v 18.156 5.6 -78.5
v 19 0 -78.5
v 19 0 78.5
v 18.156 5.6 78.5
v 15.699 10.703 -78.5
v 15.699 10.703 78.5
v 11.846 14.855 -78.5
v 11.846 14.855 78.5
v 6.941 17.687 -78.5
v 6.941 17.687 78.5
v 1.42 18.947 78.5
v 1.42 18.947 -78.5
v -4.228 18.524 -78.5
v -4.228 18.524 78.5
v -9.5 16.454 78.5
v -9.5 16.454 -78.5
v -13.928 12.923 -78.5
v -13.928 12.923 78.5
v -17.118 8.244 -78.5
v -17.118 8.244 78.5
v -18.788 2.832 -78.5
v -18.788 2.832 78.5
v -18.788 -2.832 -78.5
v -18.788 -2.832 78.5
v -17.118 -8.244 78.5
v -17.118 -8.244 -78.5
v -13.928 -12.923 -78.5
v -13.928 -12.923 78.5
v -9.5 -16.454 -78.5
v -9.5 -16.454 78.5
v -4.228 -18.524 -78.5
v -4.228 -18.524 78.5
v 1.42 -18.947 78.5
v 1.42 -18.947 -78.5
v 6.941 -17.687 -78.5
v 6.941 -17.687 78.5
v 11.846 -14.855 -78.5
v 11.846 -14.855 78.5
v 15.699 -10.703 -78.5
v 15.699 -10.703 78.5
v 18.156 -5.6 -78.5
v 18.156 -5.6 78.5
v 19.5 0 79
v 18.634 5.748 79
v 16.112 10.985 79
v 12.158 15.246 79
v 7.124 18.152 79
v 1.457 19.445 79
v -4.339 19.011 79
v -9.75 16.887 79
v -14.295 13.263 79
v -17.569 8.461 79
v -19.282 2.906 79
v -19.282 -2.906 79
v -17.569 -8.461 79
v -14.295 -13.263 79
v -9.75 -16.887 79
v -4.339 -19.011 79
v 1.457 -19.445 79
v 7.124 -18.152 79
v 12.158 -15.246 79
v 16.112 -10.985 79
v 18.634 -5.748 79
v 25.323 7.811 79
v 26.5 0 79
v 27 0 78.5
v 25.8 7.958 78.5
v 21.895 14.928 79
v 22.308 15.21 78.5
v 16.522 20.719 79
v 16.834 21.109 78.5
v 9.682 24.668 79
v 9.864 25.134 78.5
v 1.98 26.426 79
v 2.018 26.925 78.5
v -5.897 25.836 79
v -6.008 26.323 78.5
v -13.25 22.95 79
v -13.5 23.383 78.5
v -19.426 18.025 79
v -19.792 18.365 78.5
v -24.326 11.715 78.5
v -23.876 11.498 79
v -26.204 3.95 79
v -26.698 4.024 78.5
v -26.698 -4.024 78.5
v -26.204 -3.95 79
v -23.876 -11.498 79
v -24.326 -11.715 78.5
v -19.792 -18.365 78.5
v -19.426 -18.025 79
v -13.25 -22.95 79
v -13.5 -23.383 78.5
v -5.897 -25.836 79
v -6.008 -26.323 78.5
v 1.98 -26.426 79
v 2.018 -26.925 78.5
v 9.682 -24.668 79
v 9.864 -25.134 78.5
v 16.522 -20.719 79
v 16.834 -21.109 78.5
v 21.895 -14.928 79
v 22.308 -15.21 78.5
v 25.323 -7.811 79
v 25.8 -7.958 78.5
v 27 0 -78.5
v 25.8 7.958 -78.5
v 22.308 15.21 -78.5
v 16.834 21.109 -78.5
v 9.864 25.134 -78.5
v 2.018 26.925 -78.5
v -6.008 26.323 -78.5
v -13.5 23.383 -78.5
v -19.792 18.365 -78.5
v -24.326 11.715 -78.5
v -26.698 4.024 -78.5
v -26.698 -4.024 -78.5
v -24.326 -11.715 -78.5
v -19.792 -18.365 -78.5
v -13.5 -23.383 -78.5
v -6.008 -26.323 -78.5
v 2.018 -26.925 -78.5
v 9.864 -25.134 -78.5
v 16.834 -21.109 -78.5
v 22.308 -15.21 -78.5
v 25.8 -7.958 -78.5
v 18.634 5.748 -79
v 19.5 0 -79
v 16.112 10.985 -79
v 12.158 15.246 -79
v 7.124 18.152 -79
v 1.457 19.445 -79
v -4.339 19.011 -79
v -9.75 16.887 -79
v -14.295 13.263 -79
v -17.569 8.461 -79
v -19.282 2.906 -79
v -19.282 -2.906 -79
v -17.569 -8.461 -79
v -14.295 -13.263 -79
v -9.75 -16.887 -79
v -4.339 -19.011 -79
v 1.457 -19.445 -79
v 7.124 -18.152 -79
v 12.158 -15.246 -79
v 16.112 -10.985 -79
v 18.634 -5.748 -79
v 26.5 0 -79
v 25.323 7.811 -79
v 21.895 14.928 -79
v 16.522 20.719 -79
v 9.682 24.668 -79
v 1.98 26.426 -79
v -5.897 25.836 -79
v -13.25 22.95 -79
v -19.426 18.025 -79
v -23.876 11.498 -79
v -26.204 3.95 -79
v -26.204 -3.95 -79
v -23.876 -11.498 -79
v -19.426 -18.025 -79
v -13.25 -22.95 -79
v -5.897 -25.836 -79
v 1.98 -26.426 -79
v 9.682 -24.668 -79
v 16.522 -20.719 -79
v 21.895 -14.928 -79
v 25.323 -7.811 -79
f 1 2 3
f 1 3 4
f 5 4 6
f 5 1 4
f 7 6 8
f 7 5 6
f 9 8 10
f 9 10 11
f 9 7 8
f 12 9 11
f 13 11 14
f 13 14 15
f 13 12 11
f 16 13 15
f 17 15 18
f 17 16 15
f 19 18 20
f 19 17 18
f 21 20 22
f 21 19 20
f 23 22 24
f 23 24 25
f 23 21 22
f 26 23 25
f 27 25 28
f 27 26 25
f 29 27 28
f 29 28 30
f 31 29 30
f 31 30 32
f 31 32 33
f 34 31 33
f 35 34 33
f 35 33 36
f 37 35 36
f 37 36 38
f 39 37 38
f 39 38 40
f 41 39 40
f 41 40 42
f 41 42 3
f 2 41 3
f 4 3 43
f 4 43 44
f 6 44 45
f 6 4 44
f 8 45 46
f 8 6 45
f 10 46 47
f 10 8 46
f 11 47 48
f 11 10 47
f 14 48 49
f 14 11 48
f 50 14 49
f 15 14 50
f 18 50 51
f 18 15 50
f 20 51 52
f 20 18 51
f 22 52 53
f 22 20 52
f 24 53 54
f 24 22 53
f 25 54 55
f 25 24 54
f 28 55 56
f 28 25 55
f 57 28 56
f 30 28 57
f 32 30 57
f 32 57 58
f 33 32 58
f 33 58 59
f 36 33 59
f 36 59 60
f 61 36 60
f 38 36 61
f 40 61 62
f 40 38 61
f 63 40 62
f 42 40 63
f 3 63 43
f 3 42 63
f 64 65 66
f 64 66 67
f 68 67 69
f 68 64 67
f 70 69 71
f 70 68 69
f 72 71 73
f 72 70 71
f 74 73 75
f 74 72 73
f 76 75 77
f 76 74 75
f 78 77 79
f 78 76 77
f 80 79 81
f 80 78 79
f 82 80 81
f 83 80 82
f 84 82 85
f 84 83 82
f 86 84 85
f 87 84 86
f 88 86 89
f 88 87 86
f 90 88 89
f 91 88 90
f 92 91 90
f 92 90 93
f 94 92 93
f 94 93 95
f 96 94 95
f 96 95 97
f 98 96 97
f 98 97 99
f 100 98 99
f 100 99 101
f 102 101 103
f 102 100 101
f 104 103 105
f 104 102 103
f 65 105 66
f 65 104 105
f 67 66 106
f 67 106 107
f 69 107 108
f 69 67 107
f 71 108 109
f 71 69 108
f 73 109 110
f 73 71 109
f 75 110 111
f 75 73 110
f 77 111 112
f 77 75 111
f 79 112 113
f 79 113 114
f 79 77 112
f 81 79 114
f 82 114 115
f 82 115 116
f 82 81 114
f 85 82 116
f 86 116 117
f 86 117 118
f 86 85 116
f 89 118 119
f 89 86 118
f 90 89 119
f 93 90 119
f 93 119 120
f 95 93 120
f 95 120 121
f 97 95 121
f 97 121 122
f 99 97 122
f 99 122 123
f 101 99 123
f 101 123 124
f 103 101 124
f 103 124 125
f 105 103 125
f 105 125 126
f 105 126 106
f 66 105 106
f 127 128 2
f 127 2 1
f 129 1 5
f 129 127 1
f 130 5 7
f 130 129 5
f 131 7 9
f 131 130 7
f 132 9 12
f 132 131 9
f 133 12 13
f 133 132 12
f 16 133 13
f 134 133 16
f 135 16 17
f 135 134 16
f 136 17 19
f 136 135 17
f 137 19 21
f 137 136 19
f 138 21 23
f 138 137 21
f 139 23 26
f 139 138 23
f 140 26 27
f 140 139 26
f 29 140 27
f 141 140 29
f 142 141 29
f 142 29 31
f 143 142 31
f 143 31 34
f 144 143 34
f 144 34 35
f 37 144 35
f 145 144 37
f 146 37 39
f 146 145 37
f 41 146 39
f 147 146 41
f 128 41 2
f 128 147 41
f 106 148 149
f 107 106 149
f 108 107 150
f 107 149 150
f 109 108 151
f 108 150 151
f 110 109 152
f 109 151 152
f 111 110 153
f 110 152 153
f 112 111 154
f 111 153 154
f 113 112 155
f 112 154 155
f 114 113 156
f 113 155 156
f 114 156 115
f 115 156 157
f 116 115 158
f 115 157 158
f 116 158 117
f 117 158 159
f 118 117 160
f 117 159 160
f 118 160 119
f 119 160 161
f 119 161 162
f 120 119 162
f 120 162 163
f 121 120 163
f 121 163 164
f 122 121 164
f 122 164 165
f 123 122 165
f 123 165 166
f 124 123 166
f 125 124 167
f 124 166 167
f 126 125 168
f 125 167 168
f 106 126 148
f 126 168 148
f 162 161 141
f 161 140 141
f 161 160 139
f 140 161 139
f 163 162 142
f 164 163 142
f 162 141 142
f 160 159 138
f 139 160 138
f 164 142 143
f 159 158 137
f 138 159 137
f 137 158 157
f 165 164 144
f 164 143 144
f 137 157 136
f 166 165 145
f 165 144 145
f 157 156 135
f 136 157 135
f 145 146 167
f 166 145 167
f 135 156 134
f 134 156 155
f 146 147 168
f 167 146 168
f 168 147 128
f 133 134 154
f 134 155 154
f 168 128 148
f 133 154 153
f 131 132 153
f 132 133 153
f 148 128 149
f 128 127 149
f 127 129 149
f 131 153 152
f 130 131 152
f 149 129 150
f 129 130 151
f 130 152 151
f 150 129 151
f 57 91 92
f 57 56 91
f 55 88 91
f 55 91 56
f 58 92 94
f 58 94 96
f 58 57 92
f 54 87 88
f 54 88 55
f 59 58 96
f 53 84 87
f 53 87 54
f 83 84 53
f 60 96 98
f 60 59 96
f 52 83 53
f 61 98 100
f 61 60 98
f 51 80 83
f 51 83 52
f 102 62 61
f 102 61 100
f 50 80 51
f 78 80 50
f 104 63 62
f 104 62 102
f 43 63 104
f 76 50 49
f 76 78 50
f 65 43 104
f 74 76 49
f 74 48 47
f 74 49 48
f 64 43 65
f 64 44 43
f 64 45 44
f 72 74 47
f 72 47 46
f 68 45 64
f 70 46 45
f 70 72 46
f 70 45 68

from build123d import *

# Parameters (mm, degrees)
SKIZZE1_R                       = 27
SKIZZE1_R_2                     = 19
AUFSATZ_LINEAR_AUSTRAGEN1_DEPTH = 79
FASE1_SIZE                      = 0.5


with BuildPart() as part:
    # Skizze1 → Aufsatz-Linear austragen1 (new, symmetric)
    with BuildSketch(Plane.XY):
        Circle(SKIZZE1_R)
        Circle(SKIZZE1_R_2, mode=Mode.SUBTRACT)
    extrude(amount=AUFSATZ_LINEAR_AUSTRAGEN1_DEPTH, both=True)

    # Fase1
    fase1_edges = [part.edges().sort_by_distance(p)[0] for p in [
        (-27, 0, -79),
        (-27, 0, 79),
        (-19, 0, -79),
        (-19, 0, 79),
    ]]
    chamfer(fase1_edges, length=FASE1_SIZE)


solid = part.part
